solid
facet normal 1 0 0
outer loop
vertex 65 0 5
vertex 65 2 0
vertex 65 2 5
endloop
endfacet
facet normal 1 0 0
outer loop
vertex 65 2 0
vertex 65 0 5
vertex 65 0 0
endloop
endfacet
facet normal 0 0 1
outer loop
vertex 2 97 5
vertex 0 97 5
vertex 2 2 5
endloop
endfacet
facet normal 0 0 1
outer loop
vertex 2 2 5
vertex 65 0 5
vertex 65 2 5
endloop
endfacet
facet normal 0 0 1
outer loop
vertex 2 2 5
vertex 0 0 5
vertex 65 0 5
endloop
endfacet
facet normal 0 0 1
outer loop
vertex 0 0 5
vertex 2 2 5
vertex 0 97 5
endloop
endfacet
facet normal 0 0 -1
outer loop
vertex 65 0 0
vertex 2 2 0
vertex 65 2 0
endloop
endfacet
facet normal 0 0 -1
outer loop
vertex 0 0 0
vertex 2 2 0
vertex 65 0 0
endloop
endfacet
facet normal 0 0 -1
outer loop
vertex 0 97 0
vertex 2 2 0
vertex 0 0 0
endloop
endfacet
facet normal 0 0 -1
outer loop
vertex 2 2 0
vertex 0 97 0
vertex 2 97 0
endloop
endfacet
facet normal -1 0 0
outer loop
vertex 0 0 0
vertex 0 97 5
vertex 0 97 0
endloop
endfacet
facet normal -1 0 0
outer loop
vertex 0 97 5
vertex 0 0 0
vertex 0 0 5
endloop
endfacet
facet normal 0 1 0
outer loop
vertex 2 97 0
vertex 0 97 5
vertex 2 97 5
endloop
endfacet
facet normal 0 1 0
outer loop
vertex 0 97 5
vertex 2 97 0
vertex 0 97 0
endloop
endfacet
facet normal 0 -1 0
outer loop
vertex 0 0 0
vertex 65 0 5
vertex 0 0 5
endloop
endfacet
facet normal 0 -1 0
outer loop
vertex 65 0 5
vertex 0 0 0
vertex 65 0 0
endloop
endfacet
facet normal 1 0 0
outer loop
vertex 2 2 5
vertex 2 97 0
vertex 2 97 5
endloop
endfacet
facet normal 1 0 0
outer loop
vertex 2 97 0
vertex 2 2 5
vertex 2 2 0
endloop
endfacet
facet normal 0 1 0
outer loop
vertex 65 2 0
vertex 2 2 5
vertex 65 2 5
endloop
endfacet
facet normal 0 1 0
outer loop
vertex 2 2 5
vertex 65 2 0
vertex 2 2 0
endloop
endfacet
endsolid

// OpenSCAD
difference(){
    cube([65,97,5]);
    translate([2,2,-1]){
        cube([63,95,12]);
    }
}
